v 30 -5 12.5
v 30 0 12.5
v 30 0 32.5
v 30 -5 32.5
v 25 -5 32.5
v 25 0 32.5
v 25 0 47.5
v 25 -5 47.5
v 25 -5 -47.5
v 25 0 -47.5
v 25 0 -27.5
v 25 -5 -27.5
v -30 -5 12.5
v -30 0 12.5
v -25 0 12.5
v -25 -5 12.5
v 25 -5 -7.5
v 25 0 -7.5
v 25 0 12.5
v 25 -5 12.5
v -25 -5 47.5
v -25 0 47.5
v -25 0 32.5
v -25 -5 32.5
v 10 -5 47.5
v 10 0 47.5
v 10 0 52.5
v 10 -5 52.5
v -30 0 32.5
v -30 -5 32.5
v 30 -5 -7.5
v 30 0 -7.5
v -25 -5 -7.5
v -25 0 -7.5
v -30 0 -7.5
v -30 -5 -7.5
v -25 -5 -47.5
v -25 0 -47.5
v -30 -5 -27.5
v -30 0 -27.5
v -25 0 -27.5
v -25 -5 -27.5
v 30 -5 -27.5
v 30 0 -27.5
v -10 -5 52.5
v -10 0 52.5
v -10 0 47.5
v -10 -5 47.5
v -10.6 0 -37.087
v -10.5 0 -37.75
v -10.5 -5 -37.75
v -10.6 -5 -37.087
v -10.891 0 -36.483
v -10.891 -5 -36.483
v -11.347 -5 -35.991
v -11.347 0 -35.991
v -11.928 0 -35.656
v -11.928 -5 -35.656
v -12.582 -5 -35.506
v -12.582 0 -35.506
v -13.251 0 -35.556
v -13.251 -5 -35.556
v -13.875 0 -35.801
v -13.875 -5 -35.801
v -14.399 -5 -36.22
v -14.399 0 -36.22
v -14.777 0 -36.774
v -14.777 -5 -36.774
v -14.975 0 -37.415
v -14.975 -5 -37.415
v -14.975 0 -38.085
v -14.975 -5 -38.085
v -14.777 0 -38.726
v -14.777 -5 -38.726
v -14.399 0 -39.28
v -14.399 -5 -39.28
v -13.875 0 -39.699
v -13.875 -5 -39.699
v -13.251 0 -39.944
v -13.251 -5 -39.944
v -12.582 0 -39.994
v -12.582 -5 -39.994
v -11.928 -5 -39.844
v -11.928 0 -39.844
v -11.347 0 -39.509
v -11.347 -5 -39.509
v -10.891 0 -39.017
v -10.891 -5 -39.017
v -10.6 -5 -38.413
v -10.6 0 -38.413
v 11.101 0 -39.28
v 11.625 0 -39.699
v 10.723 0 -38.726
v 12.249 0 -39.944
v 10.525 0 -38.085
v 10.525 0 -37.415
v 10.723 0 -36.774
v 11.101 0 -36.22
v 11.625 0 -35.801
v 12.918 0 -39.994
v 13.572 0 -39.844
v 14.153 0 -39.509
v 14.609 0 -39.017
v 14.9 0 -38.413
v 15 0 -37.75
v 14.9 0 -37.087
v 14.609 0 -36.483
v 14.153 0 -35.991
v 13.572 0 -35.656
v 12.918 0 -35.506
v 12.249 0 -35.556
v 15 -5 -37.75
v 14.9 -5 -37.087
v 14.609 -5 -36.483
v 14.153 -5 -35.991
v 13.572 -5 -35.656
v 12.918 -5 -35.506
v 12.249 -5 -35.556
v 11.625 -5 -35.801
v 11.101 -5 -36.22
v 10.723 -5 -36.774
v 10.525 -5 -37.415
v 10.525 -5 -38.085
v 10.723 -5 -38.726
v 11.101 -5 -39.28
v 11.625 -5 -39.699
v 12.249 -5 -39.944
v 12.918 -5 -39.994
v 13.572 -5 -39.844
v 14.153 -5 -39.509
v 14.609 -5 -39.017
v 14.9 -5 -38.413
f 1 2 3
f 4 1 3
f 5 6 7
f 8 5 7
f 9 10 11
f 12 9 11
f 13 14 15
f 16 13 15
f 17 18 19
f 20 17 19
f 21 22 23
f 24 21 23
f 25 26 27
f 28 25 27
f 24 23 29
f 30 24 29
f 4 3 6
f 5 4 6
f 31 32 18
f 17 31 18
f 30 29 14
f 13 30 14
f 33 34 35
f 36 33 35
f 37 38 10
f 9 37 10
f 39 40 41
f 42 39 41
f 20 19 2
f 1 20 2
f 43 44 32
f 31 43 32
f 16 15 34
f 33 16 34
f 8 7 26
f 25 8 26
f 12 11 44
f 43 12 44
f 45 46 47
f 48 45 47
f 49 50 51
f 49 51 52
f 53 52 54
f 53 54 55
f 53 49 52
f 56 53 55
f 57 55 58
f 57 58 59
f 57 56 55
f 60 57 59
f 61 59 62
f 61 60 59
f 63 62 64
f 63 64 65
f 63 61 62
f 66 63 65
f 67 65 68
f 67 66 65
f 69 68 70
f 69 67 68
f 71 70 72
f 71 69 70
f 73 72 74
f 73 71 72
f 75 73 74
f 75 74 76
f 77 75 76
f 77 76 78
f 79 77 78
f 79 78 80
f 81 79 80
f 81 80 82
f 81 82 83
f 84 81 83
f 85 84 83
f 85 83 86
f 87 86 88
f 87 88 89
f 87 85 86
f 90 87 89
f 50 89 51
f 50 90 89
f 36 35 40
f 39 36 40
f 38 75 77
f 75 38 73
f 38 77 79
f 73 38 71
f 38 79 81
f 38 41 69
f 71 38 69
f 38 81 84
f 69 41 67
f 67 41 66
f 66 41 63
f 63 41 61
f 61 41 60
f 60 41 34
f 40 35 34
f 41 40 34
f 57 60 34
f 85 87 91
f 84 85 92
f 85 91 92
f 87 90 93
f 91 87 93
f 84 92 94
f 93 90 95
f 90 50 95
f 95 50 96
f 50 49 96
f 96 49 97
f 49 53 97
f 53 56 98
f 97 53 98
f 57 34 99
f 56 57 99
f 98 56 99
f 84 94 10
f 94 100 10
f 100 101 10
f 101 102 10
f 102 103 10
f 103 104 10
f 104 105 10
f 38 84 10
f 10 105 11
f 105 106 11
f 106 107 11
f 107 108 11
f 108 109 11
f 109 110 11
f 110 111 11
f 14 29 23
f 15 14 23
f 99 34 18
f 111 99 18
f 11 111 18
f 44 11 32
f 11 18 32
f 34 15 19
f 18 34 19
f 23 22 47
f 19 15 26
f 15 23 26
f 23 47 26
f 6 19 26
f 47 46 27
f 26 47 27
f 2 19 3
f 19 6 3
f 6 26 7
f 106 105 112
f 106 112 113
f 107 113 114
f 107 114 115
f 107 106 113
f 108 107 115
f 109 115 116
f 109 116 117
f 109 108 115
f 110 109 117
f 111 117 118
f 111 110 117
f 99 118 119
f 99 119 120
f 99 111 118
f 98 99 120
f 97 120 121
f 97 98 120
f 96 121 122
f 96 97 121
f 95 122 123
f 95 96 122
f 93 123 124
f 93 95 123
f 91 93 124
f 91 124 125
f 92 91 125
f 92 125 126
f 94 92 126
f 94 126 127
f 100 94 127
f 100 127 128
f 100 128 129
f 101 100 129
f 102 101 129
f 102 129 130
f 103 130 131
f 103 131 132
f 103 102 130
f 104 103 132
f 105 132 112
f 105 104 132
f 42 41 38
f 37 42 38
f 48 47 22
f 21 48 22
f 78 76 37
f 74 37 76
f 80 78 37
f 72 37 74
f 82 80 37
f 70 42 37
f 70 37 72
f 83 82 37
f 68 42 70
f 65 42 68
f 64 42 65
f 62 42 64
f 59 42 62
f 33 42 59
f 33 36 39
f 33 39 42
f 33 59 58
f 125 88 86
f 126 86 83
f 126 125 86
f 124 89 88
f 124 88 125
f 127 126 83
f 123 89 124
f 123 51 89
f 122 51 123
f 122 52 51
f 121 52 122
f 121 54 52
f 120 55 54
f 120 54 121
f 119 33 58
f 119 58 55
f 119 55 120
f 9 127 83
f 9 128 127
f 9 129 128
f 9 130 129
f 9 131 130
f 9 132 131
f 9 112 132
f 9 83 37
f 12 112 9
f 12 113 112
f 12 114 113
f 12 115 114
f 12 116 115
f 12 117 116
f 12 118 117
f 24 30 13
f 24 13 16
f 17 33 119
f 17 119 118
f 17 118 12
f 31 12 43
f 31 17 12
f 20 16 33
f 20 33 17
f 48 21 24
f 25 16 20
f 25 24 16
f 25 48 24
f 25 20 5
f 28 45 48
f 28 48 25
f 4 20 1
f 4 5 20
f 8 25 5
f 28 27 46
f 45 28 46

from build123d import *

# Parameters (mm, degrees)
F0_R     = 2.25
F1_DEPTH = 5


with BuildPart() as f1:
    # F0 (on Front) → F1 (new body)
    with BuildSketch(Plane.XZ):
        Polygon((25, 32.5), (25, 47.5), (10, 47.5), (10, 52.5), (-10, 52.5), (-10, 47.5), (-25, 47.5), (-25, 32.5), (-30, 32.5), (-30, 12.5), (-25, 12.5), (-25, -7.5), (-30, -7.5), (-30, -27.5), (-25, -27.5), (-25, -47.5), (25, -47.5), (25, -27.5), (30, -27.5), (30, -7.5), (25, -7.5), (25, 12.5), (30, 12.5), (30, 32.5), align=None)
        with Locations((-12.75, -37.75)):
            Circle(F0_R, mode=Mode.SUBTRACT)
        with Locations((12.75, -37.75)):
            Circle(F0_R, mode=Mode.SUBTRACT)
    extrude(amount=F1_DEPTH)


solid = f1.part
